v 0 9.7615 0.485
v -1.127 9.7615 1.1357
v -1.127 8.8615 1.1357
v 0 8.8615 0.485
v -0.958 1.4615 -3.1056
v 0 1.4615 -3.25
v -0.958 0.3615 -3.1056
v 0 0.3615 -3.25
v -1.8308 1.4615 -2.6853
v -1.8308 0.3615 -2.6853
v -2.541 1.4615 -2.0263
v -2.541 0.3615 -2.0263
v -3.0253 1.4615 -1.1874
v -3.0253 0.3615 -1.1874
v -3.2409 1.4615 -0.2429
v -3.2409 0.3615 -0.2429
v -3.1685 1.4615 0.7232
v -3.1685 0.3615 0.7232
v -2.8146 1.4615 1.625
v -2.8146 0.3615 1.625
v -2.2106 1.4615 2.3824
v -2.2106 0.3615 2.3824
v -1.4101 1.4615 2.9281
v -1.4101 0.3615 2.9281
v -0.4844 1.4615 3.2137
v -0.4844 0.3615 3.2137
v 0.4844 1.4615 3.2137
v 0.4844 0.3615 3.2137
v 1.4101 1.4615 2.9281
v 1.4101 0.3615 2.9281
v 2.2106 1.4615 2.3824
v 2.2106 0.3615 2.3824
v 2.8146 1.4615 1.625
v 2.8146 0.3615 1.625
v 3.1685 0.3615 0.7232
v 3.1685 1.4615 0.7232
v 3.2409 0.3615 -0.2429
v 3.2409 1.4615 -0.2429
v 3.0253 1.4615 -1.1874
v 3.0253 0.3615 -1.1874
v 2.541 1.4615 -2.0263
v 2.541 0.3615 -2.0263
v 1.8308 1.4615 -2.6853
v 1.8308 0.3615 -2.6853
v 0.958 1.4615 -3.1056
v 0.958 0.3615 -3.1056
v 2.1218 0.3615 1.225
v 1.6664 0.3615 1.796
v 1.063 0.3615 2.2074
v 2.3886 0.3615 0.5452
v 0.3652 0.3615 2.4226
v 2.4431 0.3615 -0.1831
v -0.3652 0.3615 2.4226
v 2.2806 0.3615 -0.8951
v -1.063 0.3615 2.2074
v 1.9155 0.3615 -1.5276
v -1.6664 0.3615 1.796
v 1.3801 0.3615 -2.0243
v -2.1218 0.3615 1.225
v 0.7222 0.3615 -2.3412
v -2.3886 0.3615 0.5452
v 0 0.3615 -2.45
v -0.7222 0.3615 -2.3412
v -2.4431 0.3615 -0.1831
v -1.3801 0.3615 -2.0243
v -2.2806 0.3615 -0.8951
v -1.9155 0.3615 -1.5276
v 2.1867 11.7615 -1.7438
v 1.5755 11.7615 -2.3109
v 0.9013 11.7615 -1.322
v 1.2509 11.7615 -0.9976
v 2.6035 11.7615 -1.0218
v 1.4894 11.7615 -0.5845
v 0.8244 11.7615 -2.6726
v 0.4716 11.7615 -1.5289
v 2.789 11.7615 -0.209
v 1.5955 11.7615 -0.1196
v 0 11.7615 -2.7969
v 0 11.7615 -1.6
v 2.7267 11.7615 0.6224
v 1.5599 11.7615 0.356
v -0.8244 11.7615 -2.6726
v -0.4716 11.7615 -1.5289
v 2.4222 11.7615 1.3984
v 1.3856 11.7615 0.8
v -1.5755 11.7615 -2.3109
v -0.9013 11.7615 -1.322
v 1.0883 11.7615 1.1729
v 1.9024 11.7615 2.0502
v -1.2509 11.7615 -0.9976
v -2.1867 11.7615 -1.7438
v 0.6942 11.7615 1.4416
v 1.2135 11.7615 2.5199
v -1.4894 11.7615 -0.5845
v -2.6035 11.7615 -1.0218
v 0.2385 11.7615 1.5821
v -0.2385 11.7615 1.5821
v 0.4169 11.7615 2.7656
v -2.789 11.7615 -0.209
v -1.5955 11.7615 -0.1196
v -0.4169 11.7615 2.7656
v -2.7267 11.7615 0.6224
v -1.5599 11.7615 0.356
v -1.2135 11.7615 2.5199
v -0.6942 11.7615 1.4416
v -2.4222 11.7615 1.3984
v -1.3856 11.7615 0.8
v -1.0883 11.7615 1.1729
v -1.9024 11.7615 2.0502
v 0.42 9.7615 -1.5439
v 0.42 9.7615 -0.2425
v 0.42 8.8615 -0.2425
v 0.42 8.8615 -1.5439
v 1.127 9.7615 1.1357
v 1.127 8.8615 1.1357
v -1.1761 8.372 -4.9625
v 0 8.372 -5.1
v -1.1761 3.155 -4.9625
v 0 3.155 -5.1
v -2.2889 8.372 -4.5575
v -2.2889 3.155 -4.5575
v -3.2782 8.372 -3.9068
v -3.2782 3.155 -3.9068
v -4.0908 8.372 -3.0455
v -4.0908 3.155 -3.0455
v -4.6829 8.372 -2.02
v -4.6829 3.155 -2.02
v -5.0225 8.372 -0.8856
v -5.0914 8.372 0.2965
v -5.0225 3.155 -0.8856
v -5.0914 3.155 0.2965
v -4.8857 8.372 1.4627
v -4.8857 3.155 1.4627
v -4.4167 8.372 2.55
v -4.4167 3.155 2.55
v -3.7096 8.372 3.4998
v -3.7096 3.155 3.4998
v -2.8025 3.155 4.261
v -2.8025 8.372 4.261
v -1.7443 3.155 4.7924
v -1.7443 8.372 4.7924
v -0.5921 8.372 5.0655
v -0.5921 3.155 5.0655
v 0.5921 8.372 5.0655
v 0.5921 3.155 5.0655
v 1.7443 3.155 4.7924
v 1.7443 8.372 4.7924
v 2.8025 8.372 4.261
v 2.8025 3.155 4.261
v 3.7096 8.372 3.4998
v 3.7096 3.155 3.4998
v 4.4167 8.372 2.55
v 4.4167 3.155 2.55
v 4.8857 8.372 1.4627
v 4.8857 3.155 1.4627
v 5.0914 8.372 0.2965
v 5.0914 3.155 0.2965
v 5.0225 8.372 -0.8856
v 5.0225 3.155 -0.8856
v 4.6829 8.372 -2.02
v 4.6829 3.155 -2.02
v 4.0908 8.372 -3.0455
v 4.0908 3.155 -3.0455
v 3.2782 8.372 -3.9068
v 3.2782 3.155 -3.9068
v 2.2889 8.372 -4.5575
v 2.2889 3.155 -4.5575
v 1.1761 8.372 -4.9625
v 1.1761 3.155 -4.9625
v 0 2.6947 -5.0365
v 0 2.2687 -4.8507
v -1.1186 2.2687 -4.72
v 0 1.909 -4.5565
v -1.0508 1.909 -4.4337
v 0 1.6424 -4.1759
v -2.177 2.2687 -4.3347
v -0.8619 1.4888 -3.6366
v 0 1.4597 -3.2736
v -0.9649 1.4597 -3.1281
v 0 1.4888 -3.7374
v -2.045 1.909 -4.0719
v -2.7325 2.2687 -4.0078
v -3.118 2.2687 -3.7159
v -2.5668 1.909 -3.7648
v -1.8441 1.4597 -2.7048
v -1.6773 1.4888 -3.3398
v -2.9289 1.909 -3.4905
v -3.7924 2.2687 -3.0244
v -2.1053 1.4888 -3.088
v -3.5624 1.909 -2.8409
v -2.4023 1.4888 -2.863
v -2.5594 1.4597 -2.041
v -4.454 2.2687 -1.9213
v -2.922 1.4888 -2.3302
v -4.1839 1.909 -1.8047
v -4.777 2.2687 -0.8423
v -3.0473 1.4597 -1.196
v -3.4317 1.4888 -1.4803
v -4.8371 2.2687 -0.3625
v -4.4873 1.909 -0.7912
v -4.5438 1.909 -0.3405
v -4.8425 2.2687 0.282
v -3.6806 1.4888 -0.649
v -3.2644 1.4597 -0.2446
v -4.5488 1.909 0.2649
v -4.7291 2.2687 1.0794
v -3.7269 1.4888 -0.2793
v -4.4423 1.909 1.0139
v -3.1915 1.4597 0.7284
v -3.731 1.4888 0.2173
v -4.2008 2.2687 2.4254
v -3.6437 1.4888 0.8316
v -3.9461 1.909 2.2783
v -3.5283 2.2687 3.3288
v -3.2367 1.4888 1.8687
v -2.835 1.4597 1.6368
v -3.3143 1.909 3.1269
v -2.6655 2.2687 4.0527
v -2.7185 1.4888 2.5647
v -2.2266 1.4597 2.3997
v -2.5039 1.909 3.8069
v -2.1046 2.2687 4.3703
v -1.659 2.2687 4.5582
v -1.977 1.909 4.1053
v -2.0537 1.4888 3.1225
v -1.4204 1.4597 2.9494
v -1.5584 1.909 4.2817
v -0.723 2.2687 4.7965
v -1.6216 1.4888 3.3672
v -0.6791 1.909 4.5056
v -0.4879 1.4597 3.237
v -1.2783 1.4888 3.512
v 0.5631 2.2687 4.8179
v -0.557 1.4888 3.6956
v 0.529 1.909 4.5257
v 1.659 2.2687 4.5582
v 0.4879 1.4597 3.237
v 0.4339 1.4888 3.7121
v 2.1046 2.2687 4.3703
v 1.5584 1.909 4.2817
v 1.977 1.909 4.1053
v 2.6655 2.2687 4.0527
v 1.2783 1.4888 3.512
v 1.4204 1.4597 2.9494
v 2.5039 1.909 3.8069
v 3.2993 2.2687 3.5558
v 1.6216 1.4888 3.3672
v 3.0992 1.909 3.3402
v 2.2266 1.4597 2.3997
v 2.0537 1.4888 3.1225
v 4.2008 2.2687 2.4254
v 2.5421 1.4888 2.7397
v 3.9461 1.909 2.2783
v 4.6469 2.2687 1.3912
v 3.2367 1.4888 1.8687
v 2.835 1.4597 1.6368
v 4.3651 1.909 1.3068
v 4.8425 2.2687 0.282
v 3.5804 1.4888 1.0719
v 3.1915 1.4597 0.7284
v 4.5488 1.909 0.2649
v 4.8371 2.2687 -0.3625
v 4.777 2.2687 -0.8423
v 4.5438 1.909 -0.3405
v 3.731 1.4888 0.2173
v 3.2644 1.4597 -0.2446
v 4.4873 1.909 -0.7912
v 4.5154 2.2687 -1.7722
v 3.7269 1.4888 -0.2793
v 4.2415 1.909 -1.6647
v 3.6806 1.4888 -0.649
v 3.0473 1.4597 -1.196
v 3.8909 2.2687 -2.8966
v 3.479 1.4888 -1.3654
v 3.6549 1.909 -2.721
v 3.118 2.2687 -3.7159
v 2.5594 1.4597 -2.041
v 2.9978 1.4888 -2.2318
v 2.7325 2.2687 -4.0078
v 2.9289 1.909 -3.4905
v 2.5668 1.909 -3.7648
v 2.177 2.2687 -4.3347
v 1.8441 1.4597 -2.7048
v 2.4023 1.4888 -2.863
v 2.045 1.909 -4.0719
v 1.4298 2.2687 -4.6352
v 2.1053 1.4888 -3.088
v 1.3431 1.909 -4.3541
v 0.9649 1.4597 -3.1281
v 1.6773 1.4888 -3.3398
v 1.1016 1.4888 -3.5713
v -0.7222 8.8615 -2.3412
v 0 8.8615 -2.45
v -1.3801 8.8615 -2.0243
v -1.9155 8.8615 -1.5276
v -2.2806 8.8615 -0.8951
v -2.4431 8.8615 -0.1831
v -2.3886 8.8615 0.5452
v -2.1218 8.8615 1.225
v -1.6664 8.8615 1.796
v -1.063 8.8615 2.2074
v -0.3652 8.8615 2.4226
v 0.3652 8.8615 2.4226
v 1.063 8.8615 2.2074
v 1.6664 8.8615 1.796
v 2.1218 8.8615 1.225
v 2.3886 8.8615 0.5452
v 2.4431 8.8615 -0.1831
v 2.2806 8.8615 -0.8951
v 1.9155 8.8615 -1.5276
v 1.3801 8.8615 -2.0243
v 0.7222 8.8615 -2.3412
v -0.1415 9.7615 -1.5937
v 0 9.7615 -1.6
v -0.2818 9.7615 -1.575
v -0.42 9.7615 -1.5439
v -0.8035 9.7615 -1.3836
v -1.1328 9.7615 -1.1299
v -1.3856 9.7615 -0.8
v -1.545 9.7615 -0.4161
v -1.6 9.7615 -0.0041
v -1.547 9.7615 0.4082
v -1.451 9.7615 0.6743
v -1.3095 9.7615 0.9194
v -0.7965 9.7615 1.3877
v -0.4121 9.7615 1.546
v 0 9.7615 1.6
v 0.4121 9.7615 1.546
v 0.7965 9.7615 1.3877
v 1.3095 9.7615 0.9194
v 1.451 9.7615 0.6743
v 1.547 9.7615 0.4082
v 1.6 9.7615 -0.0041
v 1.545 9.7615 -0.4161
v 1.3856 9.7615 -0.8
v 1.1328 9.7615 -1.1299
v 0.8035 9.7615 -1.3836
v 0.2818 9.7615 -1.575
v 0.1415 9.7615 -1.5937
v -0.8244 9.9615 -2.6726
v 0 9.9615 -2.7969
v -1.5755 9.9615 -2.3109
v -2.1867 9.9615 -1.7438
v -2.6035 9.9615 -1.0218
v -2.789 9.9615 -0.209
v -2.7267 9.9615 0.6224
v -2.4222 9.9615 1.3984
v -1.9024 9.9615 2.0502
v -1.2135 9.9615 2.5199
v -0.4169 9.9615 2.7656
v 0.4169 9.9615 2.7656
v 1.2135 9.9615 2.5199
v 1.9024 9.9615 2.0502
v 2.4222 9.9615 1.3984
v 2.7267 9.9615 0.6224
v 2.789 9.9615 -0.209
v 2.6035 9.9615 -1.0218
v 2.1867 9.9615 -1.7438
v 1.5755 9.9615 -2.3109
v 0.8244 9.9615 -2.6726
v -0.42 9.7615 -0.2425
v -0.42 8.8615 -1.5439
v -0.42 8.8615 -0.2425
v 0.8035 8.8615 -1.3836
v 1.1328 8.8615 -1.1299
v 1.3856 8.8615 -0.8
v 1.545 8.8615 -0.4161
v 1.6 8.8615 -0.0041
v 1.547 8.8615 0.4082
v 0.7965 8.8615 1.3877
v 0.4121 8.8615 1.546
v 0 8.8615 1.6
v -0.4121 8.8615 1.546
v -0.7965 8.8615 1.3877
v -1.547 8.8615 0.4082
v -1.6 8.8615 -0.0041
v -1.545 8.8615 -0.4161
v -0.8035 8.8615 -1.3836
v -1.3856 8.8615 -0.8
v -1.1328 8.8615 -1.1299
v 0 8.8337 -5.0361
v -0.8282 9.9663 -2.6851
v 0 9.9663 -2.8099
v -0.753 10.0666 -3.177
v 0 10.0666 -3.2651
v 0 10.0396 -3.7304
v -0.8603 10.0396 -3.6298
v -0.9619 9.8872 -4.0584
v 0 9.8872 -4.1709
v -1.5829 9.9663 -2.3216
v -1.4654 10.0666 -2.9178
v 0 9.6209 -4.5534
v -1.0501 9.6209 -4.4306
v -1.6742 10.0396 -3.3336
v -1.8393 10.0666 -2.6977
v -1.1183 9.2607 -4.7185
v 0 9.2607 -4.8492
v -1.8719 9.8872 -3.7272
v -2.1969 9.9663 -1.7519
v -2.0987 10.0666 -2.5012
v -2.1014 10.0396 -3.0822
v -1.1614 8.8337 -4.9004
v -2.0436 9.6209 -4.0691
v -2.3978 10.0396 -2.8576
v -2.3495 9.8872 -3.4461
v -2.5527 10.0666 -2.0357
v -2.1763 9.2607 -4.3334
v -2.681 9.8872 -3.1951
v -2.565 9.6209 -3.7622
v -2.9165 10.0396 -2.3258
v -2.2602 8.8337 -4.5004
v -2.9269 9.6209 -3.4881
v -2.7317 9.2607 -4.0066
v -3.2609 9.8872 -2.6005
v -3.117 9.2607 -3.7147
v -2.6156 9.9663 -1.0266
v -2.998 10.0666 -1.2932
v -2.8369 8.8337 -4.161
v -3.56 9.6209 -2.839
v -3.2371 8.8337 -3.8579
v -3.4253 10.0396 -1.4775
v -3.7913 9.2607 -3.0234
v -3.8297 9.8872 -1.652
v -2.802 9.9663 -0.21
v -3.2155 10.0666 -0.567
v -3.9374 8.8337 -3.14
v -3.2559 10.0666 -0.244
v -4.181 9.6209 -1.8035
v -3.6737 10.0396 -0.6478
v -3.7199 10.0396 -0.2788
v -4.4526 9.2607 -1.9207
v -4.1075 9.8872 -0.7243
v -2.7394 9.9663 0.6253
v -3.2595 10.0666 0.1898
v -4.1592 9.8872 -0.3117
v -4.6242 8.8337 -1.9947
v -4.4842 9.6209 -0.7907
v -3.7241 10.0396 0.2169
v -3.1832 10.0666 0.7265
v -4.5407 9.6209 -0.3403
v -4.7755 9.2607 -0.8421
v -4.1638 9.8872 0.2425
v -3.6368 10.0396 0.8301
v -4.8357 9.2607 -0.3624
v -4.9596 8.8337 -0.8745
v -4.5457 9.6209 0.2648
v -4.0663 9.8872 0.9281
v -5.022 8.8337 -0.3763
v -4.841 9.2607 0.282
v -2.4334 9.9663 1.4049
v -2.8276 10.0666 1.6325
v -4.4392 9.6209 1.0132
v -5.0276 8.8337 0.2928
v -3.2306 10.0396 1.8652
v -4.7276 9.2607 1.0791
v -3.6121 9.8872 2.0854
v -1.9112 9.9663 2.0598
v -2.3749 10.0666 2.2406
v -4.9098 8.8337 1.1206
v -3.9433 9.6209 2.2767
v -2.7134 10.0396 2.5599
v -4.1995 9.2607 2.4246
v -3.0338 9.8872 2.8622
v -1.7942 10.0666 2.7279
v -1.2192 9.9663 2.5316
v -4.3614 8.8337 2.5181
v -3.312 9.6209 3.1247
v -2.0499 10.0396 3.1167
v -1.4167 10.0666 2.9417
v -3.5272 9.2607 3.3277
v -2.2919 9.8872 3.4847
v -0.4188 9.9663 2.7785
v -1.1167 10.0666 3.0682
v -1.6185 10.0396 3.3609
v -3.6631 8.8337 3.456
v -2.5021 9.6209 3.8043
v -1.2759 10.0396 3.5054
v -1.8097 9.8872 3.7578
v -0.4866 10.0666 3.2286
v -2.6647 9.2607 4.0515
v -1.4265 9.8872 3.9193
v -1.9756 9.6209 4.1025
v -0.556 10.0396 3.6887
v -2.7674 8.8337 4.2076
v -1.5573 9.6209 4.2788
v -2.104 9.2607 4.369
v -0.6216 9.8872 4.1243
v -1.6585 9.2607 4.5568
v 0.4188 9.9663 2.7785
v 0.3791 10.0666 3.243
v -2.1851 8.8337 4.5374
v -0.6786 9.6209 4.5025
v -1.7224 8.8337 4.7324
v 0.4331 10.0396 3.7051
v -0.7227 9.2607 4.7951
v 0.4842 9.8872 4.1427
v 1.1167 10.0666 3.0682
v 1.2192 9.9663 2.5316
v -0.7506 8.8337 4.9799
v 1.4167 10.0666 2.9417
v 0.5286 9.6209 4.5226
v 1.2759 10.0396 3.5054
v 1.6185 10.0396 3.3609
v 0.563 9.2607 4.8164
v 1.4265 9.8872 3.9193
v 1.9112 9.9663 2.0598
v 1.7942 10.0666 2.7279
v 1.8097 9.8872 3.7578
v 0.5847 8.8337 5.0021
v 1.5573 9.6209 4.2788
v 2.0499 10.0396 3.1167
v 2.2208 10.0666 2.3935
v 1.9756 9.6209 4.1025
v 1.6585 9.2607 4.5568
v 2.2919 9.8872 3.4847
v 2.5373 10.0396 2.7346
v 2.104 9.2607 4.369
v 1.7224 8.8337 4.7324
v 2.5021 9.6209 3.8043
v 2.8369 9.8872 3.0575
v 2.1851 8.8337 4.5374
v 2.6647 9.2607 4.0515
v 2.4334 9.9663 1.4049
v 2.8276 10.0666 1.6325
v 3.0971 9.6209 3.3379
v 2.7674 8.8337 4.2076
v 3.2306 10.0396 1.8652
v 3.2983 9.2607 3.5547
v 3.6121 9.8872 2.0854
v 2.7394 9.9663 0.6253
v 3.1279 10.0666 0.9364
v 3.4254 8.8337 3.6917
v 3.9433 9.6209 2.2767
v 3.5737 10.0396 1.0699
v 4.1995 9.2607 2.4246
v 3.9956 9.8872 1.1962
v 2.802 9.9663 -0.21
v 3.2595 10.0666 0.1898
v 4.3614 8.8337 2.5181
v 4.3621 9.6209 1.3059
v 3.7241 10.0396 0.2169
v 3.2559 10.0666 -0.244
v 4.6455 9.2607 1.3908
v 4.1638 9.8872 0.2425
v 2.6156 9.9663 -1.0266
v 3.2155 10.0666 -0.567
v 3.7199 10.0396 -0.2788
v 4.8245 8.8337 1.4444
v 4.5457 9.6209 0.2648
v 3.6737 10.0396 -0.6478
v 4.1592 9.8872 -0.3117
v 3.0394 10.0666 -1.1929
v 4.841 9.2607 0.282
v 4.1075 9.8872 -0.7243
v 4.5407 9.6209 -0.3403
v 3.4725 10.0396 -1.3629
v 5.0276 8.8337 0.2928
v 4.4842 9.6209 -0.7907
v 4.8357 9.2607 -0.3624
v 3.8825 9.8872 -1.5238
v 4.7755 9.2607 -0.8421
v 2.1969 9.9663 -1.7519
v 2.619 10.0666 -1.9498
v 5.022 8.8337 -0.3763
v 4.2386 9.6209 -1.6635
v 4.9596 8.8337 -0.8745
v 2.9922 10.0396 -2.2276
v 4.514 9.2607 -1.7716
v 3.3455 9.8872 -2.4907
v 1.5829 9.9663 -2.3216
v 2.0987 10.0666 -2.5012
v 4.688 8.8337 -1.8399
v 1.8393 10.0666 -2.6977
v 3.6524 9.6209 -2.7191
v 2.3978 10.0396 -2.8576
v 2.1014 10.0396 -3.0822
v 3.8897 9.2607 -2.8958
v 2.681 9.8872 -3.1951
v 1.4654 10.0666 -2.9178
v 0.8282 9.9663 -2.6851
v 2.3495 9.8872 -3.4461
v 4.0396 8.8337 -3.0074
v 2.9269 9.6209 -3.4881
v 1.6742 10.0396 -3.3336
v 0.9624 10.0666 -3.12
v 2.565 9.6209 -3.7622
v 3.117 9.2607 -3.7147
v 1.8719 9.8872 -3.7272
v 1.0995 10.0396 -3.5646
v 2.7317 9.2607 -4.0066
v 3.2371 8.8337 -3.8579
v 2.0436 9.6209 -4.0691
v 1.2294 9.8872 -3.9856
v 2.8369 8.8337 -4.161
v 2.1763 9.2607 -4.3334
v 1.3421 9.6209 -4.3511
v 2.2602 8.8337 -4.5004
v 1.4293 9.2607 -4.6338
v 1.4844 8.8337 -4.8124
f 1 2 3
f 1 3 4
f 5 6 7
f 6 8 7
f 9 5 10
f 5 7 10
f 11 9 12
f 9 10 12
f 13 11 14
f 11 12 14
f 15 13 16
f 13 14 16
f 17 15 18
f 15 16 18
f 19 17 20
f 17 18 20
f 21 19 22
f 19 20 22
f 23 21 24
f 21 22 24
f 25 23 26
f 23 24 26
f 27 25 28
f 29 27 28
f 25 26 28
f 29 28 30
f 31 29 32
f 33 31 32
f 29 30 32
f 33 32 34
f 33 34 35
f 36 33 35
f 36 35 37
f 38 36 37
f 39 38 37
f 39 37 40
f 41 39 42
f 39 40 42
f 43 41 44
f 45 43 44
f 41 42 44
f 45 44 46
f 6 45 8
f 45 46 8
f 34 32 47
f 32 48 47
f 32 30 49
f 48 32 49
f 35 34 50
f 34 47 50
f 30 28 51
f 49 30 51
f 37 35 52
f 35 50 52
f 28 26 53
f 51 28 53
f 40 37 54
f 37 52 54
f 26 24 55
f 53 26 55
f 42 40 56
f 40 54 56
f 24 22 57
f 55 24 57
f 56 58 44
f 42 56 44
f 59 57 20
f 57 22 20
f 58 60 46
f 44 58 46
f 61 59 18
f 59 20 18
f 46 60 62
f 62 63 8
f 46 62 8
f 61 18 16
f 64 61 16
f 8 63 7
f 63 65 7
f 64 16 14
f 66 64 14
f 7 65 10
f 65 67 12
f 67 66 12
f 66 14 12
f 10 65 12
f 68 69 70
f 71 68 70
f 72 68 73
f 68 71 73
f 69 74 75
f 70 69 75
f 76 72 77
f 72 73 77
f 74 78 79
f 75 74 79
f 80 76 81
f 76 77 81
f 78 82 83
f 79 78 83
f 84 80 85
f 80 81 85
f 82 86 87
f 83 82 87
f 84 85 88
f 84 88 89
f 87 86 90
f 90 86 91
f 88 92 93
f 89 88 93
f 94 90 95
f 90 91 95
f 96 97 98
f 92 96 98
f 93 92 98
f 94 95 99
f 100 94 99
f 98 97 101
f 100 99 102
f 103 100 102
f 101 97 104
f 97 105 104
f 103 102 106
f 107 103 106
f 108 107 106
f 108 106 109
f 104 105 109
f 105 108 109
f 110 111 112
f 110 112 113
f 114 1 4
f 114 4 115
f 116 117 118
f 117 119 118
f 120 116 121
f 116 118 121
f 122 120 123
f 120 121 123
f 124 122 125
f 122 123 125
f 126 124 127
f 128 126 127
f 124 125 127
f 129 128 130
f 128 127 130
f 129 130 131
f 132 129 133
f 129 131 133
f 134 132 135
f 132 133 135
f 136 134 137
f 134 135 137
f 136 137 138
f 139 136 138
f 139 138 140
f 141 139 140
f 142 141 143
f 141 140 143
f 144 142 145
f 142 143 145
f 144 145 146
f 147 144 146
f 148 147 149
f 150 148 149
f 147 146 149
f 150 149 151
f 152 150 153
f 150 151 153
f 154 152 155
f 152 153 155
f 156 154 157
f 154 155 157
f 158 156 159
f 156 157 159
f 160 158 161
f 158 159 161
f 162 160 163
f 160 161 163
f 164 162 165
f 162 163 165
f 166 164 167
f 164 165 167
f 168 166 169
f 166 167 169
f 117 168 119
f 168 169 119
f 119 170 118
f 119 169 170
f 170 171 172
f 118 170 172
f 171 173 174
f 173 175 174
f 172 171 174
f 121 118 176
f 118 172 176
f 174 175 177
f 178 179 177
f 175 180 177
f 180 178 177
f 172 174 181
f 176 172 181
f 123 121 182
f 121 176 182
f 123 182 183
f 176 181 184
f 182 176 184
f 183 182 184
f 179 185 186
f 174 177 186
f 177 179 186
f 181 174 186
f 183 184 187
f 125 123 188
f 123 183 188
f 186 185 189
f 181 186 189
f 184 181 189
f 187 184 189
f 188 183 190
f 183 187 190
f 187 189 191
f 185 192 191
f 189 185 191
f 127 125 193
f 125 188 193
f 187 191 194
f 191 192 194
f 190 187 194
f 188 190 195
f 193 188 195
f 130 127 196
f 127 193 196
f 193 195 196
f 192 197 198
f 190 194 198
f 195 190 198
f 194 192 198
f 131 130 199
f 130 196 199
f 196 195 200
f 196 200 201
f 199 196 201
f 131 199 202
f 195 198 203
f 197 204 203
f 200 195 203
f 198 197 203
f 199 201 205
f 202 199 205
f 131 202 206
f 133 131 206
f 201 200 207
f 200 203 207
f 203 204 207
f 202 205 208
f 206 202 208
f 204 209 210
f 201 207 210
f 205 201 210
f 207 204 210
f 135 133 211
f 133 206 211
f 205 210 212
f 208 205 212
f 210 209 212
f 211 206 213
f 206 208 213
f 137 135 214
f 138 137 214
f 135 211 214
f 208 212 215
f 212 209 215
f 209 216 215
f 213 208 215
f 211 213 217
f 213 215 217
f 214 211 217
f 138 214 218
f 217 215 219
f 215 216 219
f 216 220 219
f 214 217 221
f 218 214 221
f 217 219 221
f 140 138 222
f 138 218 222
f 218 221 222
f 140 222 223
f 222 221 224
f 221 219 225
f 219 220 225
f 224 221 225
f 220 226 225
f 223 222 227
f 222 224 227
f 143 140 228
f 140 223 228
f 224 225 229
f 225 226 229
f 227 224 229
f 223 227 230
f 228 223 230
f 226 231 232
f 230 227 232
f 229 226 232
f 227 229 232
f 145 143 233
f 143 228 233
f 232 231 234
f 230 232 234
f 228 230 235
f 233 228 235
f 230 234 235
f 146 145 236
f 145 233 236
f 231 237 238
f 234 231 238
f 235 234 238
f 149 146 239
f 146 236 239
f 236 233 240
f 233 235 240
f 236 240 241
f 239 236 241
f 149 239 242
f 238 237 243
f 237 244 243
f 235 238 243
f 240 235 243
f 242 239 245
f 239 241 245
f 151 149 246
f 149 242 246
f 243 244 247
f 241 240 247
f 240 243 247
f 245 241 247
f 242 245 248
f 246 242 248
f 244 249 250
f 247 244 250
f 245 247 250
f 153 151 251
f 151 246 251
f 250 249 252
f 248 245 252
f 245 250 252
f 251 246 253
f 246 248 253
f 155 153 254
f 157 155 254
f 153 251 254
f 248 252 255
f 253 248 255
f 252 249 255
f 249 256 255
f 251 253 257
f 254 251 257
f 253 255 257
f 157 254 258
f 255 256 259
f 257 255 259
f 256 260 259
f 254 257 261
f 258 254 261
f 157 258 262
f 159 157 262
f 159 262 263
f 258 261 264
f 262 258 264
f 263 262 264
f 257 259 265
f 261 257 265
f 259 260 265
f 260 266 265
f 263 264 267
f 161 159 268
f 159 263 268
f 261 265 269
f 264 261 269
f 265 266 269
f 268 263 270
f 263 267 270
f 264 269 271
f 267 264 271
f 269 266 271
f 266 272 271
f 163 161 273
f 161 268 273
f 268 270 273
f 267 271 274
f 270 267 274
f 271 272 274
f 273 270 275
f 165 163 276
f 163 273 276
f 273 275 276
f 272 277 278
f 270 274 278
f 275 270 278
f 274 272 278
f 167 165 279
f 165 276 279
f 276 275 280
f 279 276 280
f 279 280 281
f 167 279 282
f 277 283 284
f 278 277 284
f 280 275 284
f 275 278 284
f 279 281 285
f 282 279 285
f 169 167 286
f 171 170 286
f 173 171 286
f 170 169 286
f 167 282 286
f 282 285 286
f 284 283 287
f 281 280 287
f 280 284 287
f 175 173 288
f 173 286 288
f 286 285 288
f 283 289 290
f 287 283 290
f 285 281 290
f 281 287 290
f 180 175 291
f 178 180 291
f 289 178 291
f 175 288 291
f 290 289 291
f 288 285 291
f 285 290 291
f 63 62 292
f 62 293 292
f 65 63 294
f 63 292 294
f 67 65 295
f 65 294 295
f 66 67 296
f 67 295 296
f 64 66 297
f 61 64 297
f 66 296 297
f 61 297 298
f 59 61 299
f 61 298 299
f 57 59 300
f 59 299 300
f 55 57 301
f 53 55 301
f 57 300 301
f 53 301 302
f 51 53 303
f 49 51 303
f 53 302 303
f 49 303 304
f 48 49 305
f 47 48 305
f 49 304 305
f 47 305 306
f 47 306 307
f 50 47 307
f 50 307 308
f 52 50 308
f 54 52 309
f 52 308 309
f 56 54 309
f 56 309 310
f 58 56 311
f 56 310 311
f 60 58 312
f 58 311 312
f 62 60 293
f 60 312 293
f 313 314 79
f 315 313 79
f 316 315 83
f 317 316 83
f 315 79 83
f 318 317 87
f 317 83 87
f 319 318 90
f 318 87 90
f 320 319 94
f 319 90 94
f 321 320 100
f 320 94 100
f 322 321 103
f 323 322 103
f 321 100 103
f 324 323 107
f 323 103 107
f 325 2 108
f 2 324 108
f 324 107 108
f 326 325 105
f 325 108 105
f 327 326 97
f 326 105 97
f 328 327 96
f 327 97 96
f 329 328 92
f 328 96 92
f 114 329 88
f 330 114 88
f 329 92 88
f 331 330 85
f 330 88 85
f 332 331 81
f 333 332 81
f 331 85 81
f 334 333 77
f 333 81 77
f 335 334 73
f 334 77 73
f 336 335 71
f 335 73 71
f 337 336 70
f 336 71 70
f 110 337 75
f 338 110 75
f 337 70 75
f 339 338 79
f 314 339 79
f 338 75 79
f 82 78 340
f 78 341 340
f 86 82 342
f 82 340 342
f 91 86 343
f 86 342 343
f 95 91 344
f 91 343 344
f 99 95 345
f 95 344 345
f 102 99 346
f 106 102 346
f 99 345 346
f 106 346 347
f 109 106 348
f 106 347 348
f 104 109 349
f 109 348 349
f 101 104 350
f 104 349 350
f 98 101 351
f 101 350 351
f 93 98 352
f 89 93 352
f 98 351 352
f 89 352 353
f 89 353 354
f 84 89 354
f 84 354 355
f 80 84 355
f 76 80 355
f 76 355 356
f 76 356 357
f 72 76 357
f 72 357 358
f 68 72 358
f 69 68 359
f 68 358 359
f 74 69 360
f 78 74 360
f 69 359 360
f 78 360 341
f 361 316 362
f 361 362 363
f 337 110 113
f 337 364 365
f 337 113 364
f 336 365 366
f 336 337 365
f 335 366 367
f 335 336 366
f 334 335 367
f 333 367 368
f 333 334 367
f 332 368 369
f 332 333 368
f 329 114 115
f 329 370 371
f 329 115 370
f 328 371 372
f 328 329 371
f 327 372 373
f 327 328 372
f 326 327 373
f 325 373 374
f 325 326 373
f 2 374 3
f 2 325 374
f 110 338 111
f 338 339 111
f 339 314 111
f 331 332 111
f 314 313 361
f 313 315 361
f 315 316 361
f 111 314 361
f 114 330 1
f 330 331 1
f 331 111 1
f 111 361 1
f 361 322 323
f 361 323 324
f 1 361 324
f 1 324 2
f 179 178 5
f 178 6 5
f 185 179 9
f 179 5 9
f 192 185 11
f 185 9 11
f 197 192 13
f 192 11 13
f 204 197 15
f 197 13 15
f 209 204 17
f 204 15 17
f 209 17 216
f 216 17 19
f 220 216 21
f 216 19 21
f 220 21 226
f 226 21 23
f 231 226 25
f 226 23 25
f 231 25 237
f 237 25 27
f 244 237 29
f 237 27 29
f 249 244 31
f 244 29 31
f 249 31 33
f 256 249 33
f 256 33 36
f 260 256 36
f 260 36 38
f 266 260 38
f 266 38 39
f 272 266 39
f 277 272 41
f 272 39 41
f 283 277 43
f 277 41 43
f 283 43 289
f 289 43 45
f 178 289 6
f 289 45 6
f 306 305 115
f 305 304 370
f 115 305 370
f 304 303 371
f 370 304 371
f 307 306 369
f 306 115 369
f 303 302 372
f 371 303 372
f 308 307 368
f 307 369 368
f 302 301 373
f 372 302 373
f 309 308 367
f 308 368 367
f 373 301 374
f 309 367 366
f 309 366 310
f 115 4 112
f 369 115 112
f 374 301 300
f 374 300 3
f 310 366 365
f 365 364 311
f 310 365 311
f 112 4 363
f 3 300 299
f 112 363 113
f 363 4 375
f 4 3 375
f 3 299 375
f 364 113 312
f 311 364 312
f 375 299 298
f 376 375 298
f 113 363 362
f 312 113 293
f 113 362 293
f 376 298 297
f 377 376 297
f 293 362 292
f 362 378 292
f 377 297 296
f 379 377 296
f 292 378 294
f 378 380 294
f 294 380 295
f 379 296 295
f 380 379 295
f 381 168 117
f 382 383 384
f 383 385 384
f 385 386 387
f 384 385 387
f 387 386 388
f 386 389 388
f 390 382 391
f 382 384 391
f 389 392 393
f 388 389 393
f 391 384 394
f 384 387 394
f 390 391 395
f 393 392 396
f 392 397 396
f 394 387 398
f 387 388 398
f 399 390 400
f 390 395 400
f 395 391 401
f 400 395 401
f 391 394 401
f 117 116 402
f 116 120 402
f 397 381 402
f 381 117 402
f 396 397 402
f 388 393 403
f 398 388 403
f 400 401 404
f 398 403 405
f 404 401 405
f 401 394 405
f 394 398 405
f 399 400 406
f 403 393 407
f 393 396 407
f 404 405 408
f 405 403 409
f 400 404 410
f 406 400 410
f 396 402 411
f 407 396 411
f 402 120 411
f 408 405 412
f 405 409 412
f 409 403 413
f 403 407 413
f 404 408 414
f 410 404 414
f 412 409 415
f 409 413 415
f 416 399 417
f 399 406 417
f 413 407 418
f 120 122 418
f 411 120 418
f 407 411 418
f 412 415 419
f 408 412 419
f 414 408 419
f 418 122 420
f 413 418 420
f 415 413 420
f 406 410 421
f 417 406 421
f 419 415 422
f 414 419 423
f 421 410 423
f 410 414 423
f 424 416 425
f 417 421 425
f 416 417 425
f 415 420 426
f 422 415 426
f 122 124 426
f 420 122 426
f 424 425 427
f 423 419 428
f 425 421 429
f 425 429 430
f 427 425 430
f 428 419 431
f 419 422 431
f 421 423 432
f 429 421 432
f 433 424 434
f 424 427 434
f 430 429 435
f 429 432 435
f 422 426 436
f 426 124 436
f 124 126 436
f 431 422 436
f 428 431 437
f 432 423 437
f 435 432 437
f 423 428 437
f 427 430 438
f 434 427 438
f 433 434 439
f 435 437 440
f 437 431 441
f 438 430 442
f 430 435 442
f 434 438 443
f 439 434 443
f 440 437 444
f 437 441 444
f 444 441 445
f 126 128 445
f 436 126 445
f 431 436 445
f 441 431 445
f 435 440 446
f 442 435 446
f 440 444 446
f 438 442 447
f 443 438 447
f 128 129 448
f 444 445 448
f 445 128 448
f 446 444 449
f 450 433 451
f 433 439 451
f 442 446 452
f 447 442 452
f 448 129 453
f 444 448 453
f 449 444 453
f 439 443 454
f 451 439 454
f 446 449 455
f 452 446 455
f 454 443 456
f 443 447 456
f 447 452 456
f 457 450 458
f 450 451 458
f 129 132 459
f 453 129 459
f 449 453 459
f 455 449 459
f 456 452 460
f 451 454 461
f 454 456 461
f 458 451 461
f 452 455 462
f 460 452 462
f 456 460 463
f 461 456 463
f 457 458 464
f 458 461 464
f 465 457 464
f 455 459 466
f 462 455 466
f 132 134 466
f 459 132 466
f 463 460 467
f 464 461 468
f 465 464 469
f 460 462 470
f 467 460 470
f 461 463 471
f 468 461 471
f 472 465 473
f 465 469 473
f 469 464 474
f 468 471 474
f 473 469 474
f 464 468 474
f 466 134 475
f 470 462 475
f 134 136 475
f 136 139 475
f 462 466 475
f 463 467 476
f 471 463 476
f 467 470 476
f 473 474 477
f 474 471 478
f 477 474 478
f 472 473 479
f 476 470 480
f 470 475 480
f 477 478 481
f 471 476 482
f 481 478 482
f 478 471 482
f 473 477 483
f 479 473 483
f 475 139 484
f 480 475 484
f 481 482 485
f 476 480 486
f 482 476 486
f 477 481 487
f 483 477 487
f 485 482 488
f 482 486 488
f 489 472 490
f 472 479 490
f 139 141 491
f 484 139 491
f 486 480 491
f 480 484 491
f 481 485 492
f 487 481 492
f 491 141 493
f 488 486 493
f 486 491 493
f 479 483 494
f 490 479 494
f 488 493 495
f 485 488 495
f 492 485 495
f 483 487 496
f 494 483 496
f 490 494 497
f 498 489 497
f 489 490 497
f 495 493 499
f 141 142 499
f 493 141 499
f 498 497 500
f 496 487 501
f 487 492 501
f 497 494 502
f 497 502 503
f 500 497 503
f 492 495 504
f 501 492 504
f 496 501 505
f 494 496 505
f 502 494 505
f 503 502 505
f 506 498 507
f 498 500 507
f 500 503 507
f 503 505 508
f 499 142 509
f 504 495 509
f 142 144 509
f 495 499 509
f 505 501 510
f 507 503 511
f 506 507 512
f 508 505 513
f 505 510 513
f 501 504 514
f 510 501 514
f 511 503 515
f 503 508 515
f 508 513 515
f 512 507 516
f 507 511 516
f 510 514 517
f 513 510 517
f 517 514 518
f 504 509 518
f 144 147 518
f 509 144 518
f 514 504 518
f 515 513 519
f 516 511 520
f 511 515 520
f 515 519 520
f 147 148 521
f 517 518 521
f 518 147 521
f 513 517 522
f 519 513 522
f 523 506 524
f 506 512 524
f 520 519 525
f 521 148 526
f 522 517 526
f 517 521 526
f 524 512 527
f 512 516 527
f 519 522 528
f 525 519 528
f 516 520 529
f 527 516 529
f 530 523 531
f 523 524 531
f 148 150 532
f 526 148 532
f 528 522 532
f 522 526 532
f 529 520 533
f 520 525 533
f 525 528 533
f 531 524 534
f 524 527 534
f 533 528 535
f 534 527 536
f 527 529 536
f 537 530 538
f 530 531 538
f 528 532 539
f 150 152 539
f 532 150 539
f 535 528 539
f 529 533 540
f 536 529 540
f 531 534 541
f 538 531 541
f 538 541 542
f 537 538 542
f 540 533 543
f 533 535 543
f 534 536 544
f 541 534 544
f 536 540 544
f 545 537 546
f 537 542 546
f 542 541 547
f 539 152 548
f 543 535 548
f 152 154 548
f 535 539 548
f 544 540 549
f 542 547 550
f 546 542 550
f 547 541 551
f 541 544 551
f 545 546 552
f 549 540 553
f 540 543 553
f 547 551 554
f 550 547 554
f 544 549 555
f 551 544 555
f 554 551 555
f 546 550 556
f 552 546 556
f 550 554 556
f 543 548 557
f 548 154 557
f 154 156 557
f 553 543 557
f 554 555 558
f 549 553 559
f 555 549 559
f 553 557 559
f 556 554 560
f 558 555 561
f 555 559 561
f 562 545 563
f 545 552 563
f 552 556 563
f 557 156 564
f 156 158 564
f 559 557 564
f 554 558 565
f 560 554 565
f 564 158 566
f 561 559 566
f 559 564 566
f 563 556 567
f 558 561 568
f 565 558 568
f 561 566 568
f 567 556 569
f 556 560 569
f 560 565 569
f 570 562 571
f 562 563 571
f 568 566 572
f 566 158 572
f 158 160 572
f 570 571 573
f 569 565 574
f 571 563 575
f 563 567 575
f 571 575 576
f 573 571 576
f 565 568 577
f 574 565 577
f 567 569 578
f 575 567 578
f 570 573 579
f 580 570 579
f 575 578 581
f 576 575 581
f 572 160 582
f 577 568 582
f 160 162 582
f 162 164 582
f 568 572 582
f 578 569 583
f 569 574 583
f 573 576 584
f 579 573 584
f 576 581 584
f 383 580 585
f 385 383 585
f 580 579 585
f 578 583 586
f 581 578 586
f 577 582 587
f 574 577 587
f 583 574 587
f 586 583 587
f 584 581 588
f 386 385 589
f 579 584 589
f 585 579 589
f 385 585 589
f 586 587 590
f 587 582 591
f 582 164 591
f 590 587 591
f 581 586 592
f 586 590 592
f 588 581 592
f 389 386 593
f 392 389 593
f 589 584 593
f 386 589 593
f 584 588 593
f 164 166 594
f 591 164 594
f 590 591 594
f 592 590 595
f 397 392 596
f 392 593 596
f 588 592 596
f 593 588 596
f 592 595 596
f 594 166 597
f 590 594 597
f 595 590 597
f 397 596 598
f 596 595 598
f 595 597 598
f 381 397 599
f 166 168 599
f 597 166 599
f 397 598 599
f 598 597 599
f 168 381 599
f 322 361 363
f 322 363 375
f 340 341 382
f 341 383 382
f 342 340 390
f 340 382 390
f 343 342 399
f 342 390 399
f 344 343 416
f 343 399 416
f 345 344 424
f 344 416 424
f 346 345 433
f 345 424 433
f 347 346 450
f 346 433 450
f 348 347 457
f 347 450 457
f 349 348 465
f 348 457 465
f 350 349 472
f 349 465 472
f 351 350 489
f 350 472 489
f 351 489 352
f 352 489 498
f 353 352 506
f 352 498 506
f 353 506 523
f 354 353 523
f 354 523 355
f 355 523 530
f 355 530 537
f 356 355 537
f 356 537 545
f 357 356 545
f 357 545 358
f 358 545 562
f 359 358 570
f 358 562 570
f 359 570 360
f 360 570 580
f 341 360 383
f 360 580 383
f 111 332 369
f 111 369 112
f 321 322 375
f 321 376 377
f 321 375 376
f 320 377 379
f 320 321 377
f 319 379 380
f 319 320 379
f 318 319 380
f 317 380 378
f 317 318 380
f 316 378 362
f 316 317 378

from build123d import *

# Parameters (mm, degrees)
CUT_EXTRUDE1_DEPTH = 10
CIRPATTERN1_COUNT  = 3


with BuildPart() as part:
    # Sketch1 → Head Revolve (revolve)
    with BuildSketch(Plane.XY, mode=Mode.PRIVATE) as head_revolve_sk:
        with BuildLine():
            Line((0, 8.861467442), (0, 9.761467442))
            Line((0, 9.761467442), (1.6, 9.761467442))
            Line((1.6, 9.761467442), (1.6, 11.761467442))
            Line((1.6, 11.761467442), (2.796868049, 11.761467442))
            Line((2.796868049, 11.761467442), (2.796868049, 9.961467442))
            Line((2.796868049, 9.961467442), (2.809886353, 9.966286057))
            ThreePointArc((2.809886353, 9.966286057), (4.371289555, 9.767199261), (5.1, 8.371994401))
            Line((5.1, 8.371994401), (5.1, 3.155002023))
            ThreePointArc((5.1, 3.155002023), (4.556524041, 1.909027648), (3.273585714, 1.459708707))
            Line((3.273585714, 1.459708707), (3.25, 1.461467442))
            Line((3.25, 1.461467442), (3.25, 0.361467442))
            Line((3.25, 0.361467442), (2.45, 0.361467442))
            Line((2.45, 0.361467442), (2.45, 8.861467442))
            Line((2.45, 8.861467442), (0, 8.861467442))
        make_face()
    revolve(head_revolve_sk.sketch.rotate(Axis((0, 0, 0), (0, 1, 0)), 90), axis=Axis((0, 0, 0), (0, 1, 0)))

    # Sketch2 → Cut-Extrude1 (cut)
    with BuildSketch(Plane(origin=(0, 9.761467442, 0), x_dir=(1, 0, 0), z_dir=(0, 1, 0))):
        with BuildLine():
            Line((-0.42, 1.543891188), (-0.42, 0.242487113))
            Line((-0.42, 0.242487113), (-1.547048989, -0.408214924))
            ThreePointArc((-1.547048989, -0.408214924), (-1.385640646, 0.8), (-0.42, 1.543891188))
        make_face()
    cut_extrude1 = extrude(amount=-CUT_EXTRUDE1_DEPTH, mode=Mode.SUBTRACT)

    # CirPattern1: Cut-Extrude1 ×3 about axis
    cirpattern1_axis = Axis((0, 0, 0), (0, 1, 0))
    for i in range(1, CIRPATTERN1_COUNT):
        add(cut_extrude1.rotate(cirpattern1_axis, i * 360 / CIRPATTERN1_COUNT), mode=Mode.SUBTRACT)


solid = part.part
